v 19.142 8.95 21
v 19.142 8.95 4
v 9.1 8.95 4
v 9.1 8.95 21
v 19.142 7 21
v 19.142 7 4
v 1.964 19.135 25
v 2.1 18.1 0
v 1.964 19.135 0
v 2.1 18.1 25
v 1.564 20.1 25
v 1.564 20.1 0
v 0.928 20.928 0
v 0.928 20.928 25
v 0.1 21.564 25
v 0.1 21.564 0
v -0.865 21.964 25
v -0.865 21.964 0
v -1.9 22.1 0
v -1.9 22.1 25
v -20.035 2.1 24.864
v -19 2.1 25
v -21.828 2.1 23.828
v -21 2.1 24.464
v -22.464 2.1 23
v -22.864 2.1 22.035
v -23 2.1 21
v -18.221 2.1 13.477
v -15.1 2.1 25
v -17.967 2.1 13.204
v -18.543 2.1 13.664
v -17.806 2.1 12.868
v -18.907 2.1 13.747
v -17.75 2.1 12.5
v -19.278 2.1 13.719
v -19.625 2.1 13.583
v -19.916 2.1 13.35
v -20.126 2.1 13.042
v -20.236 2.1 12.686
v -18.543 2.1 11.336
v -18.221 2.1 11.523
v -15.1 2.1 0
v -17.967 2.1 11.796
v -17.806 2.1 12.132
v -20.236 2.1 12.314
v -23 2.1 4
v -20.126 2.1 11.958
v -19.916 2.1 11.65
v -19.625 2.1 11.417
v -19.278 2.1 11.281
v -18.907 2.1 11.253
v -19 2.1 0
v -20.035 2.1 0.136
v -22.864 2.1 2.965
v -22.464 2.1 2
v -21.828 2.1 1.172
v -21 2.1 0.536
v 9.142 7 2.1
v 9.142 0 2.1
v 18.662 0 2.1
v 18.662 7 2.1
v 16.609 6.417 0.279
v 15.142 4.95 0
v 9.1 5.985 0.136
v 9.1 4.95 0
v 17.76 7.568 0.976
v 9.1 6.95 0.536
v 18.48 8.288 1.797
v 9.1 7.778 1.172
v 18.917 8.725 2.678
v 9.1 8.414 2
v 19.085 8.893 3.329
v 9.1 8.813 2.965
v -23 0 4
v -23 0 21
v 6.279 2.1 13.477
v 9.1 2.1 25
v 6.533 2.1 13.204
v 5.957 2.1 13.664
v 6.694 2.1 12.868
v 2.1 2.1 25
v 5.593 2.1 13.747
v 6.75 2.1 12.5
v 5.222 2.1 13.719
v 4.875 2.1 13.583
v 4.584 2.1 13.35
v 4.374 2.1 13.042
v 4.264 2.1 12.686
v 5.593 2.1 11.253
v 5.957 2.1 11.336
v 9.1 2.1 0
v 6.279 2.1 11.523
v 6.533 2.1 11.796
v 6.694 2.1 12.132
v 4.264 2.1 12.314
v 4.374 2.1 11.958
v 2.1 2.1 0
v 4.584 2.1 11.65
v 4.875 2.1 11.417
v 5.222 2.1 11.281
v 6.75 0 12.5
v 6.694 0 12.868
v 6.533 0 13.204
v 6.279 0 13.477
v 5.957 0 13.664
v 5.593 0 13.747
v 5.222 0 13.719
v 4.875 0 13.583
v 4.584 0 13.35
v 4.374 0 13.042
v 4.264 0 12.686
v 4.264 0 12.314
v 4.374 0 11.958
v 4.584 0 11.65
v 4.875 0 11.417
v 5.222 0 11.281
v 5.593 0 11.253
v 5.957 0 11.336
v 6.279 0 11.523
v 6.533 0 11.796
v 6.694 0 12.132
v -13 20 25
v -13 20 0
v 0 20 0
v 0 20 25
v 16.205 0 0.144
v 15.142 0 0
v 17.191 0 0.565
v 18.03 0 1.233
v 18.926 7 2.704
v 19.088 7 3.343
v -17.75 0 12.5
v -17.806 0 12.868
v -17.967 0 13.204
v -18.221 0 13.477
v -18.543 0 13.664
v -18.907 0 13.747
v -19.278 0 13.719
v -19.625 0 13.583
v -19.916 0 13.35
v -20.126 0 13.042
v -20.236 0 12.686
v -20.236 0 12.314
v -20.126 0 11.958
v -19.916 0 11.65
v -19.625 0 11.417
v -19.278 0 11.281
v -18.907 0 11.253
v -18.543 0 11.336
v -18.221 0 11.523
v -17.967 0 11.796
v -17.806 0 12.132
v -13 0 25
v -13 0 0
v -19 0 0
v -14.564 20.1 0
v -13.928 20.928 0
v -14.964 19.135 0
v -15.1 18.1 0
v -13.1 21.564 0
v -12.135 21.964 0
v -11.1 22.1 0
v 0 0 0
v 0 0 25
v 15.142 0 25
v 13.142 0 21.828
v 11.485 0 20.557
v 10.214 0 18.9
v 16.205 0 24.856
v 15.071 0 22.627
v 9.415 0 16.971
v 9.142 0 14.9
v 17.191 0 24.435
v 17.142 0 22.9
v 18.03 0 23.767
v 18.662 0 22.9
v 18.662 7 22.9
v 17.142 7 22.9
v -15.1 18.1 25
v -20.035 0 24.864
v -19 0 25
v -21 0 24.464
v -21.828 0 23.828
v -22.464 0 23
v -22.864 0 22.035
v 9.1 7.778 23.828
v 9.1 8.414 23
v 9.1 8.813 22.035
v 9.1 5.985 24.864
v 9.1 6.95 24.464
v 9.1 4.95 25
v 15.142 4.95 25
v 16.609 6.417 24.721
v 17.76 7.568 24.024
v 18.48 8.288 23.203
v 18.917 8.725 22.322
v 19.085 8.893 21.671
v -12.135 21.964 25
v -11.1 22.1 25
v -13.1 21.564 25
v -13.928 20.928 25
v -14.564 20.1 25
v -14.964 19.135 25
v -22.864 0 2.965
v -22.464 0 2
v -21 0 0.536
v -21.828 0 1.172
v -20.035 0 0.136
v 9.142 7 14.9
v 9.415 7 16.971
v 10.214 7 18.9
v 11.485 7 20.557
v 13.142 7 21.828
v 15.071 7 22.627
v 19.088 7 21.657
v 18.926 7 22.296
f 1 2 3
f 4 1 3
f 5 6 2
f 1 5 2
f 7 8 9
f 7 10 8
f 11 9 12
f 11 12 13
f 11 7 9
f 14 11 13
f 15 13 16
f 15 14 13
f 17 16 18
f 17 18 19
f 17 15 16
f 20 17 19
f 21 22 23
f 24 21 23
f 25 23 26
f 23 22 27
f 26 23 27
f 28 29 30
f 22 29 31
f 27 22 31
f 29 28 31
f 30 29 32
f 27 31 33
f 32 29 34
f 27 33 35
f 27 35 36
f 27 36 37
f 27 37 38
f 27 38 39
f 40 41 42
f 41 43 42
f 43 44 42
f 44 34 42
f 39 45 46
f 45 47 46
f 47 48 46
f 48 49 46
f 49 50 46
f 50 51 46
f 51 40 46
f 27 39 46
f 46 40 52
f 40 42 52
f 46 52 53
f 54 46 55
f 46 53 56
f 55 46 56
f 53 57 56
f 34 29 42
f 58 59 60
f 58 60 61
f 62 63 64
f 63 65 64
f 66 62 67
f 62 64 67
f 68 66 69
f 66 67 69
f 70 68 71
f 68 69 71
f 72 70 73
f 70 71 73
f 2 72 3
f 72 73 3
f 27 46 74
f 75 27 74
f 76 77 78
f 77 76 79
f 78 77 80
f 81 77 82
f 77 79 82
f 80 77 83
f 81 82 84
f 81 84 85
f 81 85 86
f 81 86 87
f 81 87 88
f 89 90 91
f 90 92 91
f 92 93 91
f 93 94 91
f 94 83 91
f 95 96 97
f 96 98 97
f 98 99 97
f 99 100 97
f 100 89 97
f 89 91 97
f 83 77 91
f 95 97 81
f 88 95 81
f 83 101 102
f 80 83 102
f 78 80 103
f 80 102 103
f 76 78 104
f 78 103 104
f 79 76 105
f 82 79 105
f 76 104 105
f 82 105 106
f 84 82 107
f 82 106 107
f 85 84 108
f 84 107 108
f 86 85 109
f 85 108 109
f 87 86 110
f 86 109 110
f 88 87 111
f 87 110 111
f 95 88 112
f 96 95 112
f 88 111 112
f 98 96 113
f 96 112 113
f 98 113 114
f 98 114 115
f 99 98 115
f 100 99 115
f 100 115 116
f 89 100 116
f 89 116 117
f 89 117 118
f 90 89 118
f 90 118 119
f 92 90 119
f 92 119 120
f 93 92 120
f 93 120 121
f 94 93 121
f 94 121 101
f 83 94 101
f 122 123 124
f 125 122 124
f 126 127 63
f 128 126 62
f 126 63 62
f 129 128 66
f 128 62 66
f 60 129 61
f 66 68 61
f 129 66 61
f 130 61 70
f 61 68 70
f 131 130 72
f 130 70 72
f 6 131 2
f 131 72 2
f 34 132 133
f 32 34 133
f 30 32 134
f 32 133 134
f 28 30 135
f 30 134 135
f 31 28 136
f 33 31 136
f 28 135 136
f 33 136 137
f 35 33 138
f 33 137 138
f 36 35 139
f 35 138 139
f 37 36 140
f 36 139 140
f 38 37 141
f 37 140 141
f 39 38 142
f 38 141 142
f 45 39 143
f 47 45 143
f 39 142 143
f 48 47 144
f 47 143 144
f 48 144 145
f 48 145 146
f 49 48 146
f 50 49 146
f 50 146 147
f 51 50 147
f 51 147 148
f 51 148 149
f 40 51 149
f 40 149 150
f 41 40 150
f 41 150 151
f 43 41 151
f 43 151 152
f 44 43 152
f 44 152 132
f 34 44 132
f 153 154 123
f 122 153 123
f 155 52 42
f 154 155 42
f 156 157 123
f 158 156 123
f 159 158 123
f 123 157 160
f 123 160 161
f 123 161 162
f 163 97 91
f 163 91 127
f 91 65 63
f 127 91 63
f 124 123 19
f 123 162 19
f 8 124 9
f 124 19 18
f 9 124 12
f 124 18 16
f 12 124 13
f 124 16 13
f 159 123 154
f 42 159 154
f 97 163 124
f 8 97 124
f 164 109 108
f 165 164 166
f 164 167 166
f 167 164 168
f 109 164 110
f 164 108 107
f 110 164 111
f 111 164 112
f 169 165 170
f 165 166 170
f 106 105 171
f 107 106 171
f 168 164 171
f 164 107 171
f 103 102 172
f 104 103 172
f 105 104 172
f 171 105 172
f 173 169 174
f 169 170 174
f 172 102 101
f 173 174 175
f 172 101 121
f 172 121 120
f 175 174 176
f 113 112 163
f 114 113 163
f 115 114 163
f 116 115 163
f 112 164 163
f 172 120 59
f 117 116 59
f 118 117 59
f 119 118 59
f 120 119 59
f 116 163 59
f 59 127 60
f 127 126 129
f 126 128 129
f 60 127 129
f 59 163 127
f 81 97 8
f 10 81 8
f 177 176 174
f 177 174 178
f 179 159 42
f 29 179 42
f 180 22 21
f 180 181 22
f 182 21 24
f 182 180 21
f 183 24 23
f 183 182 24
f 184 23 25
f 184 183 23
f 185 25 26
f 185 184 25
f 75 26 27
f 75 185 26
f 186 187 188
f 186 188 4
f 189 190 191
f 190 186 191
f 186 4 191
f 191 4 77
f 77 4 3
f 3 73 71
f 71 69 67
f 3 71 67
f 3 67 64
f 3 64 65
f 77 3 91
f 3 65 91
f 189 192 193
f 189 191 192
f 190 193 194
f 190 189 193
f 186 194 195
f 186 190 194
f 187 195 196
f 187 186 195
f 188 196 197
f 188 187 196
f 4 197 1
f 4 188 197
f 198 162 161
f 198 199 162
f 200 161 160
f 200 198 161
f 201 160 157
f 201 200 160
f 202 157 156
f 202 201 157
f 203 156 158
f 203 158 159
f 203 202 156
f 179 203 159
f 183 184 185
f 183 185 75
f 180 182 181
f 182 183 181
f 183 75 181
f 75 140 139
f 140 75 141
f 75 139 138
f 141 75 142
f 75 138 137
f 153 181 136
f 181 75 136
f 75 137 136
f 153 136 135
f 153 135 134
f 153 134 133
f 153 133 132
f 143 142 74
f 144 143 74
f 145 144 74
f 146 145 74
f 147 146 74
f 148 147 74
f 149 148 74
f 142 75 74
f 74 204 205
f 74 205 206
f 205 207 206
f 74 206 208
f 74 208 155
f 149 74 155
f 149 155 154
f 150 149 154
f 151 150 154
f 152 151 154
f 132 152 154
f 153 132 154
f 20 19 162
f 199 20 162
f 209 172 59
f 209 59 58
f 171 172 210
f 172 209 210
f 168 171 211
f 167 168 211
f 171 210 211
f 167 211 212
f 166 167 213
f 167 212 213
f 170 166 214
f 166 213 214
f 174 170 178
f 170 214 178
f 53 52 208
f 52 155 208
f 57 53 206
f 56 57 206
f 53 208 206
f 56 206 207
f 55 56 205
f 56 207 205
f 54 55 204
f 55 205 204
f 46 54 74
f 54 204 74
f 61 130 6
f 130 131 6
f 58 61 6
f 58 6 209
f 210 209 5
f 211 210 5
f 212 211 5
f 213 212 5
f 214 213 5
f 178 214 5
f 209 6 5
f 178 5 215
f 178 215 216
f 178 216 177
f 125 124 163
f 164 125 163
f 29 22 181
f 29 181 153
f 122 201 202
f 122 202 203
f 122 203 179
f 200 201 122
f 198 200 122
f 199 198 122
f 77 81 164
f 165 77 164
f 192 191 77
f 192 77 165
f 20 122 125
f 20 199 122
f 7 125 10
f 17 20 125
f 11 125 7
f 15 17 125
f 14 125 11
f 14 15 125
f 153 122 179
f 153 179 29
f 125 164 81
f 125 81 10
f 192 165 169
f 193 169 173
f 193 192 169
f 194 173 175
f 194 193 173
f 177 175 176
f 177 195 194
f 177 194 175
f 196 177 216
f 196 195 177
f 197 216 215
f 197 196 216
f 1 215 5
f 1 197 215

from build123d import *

# Parameters (mm, degrees)
F1_DEPTH = 25
F3_W     = 7
F3_H     = 20.8
F4_DEPTH = 10
F5_R     = 1.25
F6_DEPTH = 25
F7_R     = 4
F8_R     = 8


with BuildPart() as f1:
    # F0 (on Top) → F1 (new body)
    with BuildSketch(Plane.XY):
        Polygon((0, 20), (0, 0), (9.1, 0), (9.1, 2.1), (2.1, 2.1), (2.1, 22.1), (-15.1, 22.1), (-15.1, 2.1), (-23, 2.1), (-23, 0), (-13, 0), (-13, 20), align=None)
        Polygon((9.1, 2.1), (9.1, 0), (19.1419273615, 0), (19.1419273615, 8.9497342706), (9.1, 8.9497342706), align=None)
    extrude(amount=F1_DEPTH)

    # F3 (on offset) → F4 (cut)
    with BuildSketch(Plane.YZ.offset(19.1419273615)):
        with Locations((3.5, 12.5)):
            Rectangle(F3_W, F3_H)
    extrude(amount=-F4_DEPTH, mode=Mode.SUBTRACT)

    # F5 (on Front) → F6 (cut)
    with BuildSketch(Plane.XZ):
        with Locations((-19, 12.5)):
            Circle(F5_R)
        with Locations((5.5, 12.5)):
            Circle(F5_R)
    extrude(amount=-F6_DEPTH, mode=Mode.SUBTRACT)

    # F7
    f7_edges = [f1.edges().sort_by_distance(p)[0] for p in [
        (-15.1, 22.1, 12.5),
        (2.1, 22.1, 12.5),
        (14.120964, 8.949734, 25),
        (14.120964, 8.949734, 0),
        (-23, 1.05, 25),
        (-23, 1.05, 0),
        (19.141927, 4.474867, 25),
        (19.141927, 4.474867, 0),
    ]]
    fillet(f7_edges, radius=F7_R)

    # F8
    f8_edges = [f1.edges().sort_by_distance(p)[0] for p in [
        (9.141927, 3.5, 22.9),
    ]]
    fillet(f8_edges, radius=F8_R)


solid = f1.part
